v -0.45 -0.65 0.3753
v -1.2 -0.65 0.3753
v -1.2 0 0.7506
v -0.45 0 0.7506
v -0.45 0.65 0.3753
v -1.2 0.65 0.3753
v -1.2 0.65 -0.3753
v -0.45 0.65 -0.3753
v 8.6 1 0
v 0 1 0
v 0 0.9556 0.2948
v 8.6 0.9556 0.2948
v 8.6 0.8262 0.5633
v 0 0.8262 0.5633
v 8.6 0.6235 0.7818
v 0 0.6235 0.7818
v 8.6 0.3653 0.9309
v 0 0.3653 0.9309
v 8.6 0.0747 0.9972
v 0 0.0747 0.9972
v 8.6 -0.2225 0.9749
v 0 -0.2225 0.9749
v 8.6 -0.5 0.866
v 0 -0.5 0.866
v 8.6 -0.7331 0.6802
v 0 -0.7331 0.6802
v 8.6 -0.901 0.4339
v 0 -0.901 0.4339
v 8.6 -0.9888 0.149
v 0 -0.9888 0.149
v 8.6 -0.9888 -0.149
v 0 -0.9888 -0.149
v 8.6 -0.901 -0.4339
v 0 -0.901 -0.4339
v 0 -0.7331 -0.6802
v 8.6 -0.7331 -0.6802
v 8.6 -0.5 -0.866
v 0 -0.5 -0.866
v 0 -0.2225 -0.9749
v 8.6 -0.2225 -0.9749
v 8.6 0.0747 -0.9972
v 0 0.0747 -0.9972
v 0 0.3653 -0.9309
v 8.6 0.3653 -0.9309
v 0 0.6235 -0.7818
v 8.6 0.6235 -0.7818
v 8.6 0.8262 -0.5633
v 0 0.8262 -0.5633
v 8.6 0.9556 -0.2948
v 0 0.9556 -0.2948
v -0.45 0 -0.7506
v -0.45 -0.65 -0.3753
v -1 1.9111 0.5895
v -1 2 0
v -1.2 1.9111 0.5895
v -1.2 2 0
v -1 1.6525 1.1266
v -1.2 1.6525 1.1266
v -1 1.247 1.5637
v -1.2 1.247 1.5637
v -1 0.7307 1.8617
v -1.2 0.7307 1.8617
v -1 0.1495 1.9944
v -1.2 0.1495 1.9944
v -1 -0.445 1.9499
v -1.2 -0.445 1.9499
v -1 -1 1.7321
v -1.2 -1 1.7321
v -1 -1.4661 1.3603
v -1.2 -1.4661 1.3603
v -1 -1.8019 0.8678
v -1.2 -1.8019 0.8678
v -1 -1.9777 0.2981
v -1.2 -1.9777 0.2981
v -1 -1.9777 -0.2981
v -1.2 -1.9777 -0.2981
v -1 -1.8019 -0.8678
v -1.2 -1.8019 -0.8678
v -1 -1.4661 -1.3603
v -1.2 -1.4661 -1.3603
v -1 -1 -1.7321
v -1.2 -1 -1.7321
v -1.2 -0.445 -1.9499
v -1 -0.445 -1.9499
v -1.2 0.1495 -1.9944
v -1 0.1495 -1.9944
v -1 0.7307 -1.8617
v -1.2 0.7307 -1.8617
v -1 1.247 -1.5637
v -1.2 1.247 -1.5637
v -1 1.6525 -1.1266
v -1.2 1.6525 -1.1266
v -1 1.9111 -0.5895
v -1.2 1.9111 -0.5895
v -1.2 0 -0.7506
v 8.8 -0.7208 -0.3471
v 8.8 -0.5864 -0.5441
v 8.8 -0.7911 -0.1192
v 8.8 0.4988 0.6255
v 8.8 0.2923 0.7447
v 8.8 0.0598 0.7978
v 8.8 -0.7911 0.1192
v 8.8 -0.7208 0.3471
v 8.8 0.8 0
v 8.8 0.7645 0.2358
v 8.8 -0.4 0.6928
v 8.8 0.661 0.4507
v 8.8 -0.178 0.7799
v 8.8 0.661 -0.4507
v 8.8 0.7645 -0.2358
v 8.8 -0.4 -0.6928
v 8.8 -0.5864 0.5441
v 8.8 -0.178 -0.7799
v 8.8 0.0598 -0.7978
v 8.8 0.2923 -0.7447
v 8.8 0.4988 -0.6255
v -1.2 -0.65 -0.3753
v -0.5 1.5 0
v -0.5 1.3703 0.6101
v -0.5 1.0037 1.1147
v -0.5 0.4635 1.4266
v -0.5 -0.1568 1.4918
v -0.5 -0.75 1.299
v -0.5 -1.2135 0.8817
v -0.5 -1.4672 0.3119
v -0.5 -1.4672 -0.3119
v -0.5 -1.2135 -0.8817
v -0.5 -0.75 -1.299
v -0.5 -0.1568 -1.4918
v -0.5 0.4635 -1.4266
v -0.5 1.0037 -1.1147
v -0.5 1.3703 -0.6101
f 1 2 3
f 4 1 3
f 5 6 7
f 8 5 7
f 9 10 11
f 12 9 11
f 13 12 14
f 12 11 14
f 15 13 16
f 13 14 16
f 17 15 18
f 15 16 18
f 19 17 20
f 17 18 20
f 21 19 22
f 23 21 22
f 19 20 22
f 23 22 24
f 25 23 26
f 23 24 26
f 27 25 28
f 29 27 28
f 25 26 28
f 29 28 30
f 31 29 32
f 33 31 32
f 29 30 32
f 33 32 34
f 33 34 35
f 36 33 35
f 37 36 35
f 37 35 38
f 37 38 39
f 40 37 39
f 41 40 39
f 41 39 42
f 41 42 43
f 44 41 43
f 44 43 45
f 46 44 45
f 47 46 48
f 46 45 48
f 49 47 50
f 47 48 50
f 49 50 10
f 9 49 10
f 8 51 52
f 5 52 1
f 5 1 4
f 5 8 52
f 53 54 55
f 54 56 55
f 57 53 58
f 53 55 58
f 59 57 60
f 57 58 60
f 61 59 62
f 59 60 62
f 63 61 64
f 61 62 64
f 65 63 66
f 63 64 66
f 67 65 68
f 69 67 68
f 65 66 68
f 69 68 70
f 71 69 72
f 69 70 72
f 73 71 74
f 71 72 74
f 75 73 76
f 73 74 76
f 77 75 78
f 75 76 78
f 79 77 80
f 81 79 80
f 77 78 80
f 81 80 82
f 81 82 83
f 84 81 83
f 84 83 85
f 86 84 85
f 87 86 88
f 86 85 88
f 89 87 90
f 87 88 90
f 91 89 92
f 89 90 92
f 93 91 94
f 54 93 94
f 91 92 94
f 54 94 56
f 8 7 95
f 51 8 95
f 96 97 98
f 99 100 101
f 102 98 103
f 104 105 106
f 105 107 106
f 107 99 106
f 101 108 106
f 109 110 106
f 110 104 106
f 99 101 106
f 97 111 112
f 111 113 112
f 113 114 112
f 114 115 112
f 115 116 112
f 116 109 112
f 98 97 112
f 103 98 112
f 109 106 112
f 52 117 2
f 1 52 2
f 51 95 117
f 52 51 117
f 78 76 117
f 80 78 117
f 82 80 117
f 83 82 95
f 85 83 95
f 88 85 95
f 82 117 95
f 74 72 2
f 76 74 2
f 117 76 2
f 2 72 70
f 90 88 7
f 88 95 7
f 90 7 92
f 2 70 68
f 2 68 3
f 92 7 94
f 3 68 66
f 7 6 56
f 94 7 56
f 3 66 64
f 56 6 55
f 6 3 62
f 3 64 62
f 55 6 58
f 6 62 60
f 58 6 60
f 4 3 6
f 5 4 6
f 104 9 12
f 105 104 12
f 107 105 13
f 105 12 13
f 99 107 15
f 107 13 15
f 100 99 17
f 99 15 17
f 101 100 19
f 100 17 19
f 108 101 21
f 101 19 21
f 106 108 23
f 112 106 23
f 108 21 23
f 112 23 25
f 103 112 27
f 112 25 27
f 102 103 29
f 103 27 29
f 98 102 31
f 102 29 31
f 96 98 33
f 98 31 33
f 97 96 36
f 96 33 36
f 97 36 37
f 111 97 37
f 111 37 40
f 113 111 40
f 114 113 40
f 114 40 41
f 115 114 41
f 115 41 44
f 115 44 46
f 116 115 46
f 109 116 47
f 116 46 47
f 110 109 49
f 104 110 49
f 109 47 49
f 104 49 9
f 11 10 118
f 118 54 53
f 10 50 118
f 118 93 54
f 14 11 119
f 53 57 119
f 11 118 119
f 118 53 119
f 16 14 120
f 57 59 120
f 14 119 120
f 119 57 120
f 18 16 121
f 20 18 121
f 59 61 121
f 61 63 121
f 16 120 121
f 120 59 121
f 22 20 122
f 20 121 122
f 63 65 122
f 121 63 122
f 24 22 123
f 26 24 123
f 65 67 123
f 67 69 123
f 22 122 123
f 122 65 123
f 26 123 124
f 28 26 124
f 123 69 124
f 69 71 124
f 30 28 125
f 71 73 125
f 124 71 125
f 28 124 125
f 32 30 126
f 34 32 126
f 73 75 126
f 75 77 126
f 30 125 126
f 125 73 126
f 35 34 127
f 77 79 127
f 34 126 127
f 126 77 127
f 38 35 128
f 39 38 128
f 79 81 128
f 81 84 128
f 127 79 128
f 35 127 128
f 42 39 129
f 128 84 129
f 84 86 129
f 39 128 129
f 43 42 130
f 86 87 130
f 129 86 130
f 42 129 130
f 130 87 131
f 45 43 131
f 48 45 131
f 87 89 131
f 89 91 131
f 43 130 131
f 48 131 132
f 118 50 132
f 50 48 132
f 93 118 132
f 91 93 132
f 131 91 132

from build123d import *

# Parameters (mm, degrees)
CHAMFER1_SIZE      = 0.2
CUT_EXTRUDE1_DEPTH = 0.75


with BuildPart() as part:
    # Sketch1 → Revolve1 (revolve)
    with BuildSketch(Plane.XY):
        Polygon((0, 1), (-1, 2), (-1.2, 2), (-1.2, 0), (8.8, 0), (8.8, 1), align=None)
    revolve(axis=Axis((-1.2, 0, 0), (1, 0, 0)))

    # Chamfer1
    chamfer1_edges = [part.edges().sort_by_distance(p)[0] for p in [
        (8.8, -1, 0),
    ]]
    chamfer(chamfer1_edges, length=CHAMFER1_SIZE)

    # Sketch2 → Cut-Extrude1 (cut)
    with BuildSketch(Plane.ZY.offset(1.2)):
        Polygon((-0.75055535, 0), (-0.375277675, -0.65), (0.375277675, -0.65), (0.75055535, 0), (0.375277675, 0.65), (-0.375277675, 0.65), align=None)
    extrude(amount=-CUT_EXTRUDE1_DEPTH, mode=Mode.SUBTRACT)


solid = part.part
